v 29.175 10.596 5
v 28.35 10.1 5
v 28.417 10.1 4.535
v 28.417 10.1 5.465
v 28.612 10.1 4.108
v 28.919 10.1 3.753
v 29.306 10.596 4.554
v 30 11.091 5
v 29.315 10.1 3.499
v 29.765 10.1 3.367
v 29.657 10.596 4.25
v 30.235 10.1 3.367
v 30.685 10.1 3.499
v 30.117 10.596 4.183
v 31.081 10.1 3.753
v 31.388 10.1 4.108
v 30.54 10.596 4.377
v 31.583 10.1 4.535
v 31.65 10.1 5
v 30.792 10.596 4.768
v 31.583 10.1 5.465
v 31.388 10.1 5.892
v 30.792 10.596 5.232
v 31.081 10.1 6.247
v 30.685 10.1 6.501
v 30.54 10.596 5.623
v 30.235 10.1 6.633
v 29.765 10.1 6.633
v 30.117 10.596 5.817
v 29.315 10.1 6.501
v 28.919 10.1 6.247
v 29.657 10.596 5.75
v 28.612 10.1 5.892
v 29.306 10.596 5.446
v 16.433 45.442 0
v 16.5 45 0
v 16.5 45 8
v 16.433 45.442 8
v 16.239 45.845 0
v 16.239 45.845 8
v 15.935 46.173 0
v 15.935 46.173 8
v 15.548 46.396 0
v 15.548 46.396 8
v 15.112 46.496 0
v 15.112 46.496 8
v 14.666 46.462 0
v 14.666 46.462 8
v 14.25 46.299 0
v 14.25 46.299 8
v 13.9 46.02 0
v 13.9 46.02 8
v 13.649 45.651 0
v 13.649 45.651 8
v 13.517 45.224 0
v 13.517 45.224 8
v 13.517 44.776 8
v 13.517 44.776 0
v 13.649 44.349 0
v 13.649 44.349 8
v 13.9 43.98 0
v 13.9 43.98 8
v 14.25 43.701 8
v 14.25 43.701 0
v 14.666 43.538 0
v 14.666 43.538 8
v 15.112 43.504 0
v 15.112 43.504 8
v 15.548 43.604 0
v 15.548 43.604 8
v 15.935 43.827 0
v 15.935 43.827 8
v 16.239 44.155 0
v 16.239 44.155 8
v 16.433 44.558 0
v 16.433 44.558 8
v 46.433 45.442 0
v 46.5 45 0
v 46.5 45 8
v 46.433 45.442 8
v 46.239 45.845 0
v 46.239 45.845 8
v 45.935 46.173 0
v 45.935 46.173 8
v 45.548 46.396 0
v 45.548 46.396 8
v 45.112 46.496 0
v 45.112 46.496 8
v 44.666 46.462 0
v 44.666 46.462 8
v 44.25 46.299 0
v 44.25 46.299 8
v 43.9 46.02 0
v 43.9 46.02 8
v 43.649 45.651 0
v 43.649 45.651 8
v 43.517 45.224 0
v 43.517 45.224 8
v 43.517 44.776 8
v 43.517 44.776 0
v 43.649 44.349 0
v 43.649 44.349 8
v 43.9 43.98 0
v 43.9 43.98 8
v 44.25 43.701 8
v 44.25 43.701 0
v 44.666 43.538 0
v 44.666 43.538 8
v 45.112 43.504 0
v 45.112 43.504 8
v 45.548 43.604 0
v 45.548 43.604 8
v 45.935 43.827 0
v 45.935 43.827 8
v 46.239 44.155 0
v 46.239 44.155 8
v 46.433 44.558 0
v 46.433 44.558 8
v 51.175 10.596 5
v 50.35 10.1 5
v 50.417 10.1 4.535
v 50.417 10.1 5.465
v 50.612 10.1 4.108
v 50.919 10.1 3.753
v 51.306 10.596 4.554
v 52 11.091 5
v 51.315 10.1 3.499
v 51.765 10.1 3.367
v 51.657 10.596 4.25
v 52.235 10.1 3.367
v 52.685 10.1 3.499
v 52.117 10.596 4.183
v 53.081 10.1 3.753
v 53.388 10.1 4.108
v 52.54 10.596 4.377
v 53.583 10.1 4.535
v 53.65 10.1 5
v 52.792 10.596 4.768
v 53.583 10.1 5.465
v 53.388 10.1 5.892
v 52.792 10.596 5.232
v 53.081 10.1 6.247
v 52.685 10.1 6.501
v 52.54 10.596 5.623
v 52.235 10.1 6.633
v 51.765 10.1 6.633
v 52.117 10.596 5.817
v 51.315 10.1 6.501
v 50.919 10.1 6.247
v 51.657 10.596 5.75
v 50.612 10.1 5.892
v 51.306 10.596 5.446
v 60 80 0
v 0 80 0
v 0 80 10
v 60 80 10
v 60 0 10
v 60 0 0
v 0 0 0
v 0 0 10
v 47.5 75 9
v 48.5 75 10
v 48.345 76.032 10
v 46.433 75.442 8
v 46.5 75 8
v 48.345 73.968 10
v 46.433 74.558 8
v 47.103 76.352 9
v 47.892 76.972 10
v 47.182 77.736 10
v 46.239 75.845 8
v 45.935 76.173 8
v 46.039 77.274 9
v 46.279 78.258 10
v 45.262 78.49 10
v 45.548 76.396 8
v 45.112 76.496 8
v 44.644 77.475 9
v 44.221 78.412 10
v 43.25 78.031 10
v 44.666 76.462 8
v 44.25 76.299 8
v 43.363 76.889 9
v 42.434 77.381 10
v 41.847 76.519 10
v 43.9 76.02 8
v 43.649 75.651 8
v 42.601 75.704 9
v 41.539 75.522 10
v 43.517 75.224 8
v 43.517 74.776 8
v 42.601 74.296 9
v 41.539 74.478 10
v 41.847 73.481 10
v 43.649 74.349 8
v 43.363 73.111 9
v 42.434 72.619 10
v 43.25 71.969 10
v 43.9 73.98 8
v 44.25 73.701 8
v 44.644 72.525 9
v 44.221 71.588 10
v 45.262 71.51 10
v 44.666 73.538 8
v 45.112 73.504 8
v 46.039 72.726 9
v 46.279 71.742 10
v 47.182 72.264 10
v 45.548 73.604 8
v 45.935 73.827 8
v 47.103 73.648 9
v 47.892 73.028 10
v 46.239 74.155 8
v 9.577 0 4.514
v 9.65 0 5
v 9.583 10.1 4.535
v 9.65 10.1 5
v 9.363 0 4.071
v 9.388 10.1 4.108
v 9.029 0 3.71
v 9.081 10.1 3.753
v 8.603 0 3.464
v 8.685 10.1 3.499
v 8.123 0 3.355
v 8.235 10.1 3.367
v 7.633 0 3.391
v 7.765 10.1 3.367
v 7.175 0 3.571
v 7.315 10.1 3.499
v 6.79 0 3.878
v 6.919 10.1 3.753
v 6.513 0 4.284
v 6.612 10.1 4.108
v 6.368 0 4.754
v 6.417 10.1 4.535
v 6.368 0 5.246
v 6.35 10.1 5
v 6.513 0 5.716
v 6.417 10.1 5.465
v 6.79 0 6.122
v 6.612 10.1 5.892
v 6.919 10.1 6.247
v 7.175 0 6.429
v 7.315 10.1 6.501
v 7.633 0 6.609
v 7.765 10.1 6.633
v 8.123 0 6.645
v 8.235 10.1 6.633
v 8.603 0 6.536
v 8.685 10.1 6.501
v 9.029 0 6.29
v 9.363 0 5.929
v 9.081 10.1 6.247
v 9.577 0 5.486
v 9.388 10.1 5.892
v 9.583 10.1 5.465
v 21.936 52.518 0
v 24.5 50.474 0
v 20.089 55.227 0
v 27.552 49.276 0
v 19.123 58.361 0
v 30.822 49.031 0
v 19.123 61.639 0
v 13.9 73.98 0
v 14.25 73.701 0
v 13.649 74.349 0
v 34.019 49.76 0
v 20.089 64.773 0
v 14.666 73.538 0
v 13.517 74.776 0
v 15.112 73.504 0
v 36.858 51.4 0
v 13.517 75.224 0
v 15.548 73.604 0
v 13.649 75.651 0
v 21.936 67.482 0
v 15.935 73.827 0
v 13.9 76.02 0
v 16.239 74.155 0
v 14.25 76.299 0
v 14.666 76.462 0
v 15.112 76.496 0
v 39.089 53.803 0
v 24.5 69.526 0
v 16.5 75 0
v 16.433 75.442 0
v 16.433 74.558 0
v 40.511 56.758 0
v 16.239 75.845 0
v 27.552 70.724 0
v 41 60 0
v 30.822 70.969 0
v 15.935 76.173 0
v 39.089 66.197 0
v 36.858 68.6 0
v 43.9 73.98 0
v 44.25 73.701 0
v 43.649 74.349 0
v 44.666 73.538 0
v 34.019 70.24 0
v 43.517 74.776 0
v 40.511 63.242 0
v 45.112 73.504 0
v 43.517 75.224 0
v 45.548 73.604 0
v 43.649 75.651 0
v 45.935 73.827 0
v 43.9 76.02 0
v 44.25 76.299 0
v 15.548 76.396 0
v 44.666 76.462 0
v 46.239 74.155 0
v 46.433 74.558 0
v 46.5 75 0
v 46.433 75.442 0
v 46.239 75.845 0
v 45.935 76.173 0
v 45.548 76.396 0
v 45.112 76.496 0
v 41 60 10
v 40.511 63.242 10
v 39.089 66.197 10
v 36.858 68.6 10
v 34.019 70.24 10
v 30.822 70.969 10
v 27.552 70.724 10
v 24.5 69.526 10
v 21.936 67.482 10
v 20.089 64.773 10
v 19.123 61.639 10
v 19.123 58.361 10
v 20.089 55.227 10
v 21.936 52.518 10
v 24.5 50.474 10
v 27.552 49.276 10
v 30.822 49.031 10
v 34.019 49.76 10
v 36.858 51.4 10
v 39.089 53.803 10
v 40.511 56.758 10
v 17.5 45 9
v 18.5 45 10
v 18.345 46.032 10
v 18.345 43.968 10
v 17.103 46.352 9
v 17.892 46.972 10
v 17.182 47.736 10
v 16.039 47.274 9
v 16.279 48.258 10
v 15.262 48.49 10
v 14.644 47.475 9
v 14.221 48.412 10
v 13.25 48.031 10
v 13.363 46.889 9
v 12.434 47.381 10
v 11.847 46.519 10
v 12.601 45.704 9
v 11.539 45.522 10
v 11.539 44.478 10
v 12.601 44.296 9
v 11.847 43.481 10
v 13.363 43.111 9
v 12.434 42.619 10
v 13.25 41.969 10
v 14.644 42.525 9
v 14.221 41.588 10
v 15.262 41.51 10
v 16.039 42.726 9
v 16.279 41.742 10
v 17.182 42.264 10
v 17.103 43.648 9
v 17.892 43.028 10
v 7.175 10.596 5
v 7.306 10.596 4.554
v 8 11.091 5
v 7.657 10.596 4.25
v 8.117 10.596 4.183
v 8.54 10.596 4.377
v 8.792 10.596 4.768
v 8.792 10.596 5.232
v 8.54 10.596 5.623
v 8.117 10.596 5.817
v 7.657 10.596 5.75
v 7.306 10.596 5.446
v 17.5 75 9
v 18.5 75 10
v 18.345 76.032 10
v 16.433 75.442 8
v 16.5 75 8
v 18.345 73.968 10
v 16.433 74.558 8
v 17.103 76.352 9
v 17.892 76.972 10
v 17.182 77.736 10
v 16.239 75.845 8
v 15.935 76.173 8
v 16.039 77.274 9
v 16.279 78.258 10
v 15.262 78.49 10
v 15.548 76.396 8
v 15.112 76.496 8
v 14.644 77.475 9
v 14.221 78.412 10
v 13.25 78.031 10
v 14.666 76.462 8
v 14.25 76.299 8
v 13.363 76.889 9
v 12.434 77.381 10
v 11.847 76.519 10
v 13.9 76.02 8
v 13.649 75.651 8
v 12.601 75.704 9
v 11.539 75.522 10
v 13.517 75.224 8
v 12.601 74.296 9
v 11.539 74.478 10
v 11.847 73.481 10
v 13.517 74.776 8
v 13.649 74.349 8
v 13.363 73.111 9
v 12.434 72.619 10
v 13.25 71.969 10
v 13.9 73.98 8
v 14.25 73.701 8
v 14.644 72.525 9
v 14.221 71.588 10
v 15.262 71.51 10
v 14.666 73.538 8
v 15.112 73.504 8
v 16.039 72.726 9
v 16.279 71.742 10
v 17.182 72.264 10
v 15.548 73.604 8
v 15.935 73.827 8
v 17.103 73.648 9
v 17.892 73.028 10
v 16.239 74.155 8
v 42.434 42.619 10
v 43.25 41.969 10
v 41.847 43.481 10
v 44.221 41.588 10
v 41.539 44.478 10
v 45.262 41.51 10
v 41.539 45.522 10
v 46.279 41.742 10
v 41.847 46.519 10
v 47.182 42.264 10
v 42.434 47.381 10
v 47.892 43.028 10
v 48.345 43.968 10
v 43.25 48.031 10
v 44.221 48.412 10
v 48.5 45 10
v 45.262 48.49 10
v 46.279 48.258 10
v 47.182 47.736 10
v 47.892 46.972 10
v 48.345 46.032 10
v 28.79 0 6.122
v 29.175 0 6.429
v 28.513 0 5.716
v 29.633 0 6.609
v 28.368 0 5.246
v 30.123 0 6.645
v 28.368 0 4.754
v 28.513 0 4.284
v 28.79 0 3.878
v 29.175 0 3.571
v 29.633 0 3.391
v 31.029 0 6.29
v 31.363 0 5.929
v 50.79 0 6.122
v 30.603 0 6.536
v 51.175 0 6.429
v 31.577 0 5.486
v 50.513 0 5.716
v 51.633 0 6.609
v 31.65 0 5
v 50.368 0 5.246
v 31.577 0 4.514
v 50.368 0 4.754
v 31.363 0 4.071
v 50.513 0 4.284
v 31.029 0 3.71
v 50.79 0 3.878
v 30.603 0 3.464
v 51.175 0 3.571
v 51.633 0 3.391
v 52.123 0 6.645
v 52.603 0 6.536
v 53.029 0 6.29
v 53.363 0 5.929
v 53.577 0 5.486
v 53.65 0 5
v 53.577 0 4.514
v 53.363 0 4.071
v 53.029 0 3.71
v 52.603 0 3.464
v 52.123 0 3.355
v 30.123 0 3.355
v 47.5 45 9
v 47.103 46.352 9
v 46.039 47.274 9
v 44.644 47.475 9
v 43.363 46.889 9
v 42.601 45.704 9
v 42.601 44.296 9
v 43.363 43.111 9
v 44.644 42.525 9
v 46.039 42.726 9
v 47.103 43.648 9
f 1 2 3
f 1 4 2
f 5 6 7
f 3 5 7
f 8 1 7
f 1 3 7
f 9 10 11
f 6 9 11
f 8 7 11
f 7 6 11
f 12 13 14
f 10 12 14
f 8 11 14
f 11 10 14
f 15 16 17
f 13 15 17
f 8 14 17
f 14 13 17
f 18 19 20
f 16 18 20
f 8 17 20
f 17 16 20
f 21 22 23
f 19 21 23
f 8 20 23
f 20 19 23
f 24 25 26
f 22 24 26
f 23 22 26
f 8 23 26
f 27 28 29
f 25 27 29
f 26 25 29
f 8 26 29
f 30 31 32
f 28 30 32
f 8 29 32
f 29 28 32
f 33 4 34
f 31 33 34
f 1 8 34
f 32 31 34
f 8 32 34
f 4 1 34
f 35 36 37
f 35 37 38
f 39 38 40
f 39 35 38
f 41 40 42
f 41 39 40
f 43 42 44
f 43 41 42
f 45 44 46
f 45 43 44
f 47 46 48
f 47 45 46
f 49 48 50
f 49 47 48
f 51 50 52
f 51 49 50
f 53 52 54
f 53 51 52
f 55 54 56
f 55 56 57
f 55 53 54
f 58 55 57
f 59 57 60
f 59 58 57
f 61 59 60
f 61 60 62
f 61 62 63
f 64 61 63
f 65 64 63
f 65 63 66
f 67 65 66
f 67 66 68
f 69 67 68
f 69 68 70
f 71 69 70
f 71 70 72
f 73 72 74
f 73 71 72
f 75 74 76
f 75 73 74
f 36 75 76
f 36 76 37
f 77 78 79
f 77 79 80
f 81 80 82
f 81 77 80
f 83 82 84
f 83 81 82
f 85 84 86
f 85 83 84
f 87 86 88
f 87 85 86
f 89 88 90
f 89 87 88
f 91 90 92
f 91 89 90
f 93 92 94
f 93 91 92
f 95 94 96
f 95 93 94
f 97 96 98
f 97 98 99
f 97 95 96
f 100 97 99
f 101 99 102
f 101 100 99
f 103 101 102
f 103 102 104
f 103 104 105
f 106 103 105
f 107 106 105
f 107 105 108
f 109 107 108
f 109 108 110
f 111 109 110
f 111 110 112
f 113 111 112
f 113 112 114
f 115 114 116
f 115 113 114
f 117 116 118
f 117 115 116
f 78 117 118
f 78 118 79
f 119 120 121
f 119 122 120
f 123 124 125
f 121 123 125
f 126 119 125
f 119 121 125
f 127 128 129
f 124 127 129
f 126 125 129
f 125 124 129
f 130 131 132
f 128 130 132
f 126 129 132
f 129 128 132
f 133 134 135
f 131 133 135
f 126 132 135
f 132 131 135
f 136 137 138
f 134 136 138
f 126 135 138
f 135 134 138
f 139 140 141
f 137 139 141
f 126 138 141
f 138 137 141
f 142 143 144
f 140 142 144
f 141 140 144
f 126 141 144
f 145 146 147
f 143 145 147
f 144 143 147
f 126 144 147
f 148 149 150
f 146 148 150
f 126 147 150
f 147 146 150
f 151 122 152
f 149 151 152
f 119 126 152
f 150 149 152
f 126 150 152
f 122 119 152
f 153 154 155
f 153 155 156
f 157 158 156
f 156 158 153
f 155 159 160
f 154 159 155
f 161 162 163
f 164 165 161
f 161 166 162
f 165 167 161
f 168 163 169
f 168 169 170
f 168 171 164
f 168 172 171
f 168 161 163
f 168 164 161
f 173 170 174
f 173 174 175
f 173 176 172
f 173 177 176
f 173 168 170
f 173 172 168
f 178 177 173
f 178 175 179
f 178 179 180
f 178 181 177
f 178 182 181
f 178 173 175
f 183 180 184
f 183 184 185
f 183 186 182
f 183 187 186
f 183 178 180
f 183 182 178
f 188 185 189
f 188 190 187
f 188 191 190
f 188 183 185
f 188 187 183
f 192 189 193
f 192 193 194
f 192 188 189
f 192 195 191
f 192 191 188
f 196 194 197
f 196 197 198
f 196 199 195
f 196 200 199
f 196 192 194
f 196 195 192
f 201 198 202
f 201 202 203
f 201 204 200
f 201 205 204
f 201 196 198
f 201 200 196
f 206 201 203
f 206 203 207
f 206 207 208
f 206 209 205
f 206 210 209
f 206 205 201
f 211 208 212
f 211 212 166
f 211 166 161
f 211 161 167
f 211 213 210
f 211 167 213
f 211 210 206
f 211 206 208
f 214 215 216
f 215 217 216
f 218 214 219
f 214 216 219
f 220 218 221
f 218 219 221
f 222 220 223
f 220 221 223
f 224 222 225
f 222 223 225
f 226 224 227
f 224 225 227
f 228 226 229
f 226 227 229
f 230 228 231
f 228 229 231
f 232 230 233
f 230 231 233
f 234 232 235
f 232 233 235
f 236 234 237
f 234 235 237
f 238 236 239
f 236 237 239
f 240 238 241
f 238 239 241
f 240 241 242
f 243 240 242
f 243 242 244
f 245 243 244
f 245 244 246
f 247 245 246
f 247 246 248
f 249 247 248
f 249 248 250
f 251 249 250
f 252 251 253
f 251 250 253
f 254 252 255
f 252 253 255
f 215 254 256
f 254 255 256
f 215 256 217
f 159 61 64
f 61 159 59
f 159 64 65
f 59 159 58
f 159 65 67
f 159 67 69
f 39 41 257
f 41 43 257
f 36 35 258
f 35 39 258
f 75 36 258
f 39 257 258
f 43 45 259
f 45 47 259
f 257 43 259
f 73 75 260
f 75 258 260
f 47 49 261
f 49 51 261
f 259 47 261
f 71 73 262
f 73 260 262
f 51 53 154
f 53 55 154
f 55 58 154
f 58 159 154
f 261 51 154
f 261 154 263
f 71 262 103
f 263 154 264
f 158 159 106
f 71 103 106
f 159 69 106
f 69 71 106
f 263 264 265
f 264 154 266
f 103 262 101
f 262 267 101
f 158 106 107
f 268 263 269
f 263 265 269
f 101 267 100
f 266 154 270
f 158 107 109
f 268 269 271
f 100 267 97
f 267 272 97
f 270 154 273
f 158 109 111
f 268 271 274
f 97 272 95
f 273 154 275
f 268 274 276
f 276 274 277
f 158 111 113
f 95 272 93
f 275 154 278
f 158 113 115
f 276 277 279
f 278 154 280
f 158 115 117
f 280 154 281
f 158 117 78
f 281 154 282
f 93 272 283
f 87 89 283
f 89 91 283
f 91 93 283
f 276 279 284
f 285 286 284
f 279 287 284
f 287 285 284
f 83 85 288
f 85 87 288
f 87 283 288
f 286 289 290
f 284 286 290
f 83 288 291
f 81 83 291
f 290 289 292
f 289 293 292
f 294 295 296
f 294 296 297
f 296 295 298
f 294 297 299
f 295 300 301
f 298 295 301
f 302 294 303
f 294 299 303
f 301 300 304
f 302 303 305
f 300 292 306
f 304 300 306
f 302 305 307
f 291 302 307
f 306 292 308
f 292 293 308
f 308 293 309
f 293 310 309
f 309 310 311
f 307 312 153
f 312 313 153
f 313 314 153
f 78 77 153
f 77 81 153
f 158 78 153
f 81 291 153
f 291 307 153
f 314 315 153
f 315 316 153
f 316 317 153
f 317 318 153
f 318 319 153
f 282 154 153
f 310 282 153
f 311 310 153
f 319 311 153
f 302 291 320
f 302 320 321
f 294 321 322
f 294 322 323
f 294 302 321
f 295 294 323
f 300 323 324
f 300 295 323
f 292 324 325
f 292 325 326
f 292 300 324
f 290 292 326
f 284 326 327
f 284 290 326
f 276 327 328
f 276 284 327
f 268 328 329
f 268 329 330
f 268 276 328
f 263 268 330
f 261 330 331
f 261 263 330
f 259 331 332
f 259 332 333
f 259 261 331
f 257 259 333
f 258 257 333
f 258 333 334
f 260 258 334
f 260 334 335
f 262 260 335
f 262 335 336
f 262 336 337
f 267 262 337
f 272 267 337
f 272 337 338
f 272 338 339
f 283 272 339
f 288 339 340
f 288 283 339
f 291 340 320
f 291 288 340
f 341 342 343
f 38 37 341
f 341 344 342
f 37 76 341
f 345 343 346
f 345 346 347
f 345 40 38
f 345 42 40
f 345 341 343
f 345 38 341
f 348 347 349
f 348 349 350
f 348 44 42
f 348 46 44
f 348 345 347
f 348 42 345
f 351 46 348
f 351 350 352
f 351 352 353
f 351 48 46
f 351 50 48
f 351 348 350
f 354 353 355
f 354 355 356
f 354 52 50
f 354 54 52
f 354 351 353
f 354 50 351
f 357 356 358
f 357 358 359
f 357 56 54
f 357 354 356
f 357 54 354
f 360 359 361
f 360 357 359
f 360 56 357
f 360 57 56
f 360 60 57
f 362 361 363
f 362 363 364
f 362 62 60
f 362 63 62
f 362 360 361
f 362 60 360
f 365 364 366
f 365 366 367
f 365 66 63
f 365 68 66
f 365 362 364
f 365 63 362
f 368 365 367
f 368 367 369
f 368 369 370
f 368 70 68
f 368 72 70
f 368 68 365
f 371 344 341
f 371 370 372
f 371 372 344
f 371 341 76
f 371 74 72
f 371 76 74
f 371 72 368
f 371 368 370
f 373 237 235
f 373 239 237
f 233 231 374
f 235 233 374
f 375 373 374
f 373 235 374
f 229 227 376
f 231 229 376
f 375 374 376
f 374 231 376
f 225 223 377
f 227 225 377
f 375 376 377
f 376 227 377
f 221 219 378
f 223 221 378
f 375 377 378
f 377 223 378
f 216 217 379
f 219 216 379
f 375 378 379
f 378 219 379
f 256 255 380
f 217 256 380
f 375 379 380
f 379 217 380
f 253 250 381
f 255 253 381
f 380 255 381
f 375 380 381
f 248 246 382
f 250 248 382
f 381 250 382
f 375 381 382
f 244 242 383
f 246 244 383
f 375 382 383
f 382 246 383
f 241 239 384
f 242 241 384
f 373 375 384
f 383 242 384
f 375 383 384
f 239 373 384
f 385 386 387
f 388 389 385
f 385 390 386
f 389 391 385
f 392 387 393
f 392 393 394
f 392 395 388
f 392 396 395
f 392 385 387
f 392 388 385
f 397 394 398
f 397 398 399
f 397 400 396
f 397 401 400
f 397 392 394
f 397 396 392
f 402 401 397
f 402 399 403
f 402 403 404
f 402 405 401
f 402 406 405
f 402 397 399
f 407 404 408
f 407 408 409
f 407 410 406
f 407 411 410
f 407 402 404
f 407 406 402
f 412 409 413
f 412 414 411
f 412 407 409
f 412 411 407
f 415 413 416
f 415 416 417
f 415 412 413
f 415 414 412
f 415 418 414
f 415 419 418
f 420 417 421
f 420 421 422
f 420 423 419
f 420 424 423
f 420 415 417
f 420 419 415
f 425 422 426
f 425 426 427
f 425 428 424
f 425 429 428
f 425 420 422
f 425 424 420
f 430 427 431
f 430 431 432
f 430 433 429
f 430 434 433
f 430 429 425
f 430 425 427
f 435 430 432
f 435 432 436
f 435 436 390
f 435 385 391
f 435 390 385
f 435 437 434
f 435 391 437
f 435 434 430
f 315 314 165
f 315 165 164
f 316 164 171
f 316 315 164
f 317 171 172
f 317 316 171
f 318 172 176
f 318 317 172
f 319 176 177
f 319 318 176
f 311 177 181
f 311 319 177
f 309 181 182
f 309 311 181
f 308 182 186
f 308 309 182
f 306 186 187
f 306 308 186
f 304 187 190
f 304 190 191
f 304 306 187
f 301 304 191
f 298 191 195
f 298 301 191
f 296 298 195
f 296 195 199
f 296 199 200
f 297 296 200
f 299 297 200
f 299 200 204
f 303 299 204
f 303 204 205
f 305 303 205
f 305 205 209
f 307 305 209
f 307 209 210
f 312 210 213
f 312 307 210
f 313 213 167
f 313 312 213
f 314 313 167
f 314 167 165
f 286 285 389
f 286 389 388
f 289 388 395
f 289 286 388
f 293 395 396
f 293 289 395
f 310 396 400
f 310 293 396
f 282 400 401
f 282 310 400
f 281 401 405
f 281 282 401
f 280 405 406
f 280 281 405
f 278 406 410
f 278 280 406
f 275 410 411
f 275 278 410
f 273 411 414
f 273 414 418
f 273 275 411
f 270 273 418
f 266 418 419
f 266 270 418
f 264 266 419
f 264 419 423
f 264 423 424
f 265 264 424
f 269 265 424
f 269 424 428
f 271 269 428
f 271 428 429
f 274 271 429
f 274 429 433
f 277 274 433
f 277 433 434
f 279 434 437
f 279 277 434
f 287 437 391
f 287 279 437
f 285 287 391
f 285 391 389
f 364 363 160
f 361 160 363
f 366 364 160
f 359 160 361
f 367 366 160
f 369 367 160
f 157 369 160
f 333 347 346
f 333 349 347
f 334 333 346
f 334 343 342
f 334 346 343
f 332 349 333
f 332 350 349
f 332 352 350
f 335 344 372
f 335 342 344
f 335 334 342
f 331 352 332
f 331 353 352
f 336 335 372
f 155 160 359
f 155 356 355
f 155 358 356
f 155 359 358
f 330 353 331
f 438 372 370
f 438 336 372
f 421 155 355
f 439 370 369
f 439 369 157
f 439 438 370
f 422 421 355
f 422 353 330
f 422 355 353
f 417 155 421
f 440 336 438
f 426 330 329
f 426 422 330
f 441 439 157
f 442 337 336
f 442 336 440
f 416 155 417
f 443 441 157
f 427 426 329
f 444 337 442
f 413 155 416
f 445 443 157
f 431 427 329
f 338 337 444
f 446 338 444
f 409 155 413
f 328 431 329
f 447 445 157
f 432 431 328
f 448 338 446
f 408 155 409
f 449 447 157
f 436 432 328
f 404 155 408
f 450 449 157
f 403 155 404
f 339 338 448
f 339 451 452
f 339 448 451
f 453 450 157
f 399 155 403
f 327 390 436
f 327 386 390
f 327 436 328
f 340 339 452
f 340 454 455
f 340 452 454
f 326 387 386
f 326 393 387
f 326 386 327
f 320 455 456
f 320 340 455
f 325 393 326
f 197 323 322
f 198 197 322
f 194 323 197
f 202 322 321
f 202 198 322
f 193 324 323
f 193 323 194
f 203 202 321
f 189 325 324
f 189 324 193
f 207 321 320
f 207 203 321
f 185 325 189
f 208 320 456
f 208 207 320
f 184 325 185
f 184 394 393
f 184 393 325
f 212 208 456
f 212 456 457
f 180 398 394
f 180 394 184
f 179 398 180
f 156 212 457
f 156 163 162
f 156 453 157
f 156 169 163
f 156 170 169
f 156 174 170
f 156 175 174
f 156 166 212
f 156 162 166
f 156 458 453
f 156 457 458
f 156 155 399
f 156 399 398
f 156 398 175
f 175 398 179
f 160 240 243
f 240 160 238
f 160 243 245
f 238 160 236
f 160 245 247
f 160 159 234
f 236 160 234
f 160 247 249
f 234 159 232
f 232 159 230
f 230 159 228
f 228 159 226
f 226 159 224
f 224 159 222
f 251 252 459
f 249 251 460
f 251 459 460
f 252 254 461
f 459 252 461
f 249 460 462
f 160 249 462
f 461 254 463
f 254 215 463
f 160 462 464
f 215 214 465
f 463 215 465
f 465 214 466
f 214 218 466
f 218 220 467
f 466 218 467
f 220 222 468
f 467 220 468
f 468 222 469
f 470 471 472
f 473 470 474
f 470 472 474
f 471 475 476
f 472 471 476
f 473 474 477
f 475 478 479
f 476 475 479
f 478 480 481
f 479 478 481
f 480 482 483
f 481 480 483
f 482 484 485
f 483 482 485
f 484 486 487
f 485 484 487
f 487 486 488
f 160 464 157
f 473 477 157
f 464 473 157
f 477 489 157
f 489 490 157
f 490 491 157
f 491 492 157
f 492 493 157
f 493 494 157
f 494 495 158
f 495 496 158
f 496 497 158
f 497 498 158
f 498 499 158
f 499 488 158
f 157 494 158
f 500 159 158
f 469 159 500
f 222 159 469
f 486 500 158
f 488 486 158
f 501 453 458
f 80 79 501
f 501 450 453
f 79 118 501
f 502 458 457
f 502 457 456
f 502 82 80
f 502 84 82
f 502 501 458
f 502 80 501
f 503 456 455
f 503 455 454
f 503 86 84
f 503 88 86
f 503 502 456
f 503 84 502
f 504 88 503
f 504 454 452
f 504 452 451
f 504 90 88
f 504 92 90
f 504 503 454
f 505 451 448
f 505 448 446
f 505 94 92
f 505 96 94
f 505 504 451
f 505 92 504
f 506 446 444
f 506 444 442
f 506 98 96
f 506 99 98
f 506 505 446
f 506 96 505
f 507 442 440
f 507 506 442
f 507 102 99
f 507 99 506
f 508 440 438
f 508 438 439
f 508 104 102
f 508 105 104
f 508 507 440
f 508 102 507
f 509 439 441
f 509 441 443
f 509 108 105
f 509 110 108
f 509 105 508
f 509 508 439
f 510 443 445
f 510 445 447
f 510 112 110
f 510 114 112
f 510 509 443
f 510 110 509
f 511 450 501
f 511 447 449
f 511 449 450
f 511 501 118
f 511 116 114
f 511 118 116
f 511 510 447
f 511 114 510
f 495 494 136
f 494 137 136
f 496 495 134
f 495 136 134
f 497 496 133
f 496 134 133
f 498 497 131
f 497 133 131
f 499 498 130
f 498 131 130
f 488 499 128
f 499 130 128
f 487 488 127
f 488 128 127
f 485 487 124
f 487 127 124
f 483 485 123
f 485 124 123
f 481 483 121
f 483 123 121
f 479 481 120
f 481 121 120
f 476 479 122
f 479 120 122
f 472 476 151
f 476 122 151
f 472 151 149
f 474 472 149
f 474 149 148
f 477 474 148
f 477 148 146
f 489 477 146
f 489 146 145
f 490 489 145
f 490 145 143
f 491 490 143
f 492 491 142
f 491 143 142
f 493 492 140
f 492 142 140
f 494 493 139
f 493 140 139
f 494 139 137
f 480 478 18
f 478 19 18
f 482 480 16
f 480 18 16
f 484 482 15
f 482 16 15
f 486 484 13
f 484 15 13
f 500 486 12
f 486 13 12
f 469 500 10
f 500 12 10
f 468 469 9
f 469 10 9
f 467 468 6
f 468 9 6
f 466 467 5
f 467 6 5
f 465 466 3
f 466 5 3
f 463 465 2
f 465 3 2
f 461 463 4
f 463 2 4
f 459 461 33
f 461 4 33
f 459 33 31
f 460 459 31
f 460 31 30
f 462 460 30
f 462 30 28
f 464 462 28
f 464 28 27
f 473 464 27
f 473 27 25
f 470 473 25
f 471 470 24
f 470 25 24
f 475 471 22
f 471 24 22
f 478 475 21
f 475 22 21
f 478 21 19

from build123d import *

# Parameters (mm, degrees)
SKETCH1_W                 = 60
SKETCH1_H                 = 80
SKETCH1_R                 = 11
SKETCH1_R_2               = 1.5
BOSS_EXTRUDE1_DEPTH       = 10
M4X0_7_TAPPED_HOLE1_D     = 3.3
M4X0_7_TAPPED_HOLE1_DEPTH = 10.1
M4X0_7_TAPPED_HOLE1_TIP   = 0.991420021
CHAMFER1_SIZE             = 2


with BuildPart() as part:
    # Sketch1 → Boss-Extrude1 (new body)
    with BuildSketch(Plane.XY):
        with Locations((30, 40)):
            Rectangle(SKETCH1_W, SKETCH1_H)
        with Locations((30, 60)):
            Circle(SKETCH1_R, mode=Mode.SUBTRACT)
        with Locations((15, 75)):
            Circle(SKETCH1_R_2, mode=Mode.SUBTRACT)
        with Locations((45, 75)):
            Circle(SKETCH1_R_2, mode=Mode.SUBTRACT)
        with Locations((45, 45)):
            Circle(SKETCH1_R_2, mode=Mode.SUBTRACT)
        with Locations((15, 45)):
            Circle(SKETCH1_R_2, mode=Mode.SUBTRACT)
    extrude(amount=BOSS_EXTRUDE1_DEPTH)

    # M4x0.7 Tapped Hole1
    with Locations(Plane(origin=(0, 0, 0), x_dir=(-1, 0, 0), z_dir=(0, -1, 0))):
        with Locations((-8, -5), (-30, -5), (-52, -5)):
            Hole(M4X0_7_TAPPED_HOLE1_D / 2, depth=M4X0_7_TAPPED_HOLE1_DEPTH)
            with Locations((0, 0, -(M4X0_7_TAPPED_HOLE1_DEPTH + M4X0_7_TAPPED_HOLE1_TIP / 2))):  # 118° drill point
                Cone(0, M4X0_7_TAPPED_HOLE1_D / 2, M4X0_7_TAPPED_HOLE1_TIP, mode=Mode.SUBTRACT)

    # Chamfer1
    chamfer1_edges = [part.edges().sort_by_distance(p)[0] for p in [
        (13.5, 75, 10),
        (43.5, 75, 10),
        (43.5, 45, 10),
        (13.5, 45, 10),
    ]]
    chamfer(chamfer1_edges, length=CHAMFER1_SIZE)


solid = part.part
